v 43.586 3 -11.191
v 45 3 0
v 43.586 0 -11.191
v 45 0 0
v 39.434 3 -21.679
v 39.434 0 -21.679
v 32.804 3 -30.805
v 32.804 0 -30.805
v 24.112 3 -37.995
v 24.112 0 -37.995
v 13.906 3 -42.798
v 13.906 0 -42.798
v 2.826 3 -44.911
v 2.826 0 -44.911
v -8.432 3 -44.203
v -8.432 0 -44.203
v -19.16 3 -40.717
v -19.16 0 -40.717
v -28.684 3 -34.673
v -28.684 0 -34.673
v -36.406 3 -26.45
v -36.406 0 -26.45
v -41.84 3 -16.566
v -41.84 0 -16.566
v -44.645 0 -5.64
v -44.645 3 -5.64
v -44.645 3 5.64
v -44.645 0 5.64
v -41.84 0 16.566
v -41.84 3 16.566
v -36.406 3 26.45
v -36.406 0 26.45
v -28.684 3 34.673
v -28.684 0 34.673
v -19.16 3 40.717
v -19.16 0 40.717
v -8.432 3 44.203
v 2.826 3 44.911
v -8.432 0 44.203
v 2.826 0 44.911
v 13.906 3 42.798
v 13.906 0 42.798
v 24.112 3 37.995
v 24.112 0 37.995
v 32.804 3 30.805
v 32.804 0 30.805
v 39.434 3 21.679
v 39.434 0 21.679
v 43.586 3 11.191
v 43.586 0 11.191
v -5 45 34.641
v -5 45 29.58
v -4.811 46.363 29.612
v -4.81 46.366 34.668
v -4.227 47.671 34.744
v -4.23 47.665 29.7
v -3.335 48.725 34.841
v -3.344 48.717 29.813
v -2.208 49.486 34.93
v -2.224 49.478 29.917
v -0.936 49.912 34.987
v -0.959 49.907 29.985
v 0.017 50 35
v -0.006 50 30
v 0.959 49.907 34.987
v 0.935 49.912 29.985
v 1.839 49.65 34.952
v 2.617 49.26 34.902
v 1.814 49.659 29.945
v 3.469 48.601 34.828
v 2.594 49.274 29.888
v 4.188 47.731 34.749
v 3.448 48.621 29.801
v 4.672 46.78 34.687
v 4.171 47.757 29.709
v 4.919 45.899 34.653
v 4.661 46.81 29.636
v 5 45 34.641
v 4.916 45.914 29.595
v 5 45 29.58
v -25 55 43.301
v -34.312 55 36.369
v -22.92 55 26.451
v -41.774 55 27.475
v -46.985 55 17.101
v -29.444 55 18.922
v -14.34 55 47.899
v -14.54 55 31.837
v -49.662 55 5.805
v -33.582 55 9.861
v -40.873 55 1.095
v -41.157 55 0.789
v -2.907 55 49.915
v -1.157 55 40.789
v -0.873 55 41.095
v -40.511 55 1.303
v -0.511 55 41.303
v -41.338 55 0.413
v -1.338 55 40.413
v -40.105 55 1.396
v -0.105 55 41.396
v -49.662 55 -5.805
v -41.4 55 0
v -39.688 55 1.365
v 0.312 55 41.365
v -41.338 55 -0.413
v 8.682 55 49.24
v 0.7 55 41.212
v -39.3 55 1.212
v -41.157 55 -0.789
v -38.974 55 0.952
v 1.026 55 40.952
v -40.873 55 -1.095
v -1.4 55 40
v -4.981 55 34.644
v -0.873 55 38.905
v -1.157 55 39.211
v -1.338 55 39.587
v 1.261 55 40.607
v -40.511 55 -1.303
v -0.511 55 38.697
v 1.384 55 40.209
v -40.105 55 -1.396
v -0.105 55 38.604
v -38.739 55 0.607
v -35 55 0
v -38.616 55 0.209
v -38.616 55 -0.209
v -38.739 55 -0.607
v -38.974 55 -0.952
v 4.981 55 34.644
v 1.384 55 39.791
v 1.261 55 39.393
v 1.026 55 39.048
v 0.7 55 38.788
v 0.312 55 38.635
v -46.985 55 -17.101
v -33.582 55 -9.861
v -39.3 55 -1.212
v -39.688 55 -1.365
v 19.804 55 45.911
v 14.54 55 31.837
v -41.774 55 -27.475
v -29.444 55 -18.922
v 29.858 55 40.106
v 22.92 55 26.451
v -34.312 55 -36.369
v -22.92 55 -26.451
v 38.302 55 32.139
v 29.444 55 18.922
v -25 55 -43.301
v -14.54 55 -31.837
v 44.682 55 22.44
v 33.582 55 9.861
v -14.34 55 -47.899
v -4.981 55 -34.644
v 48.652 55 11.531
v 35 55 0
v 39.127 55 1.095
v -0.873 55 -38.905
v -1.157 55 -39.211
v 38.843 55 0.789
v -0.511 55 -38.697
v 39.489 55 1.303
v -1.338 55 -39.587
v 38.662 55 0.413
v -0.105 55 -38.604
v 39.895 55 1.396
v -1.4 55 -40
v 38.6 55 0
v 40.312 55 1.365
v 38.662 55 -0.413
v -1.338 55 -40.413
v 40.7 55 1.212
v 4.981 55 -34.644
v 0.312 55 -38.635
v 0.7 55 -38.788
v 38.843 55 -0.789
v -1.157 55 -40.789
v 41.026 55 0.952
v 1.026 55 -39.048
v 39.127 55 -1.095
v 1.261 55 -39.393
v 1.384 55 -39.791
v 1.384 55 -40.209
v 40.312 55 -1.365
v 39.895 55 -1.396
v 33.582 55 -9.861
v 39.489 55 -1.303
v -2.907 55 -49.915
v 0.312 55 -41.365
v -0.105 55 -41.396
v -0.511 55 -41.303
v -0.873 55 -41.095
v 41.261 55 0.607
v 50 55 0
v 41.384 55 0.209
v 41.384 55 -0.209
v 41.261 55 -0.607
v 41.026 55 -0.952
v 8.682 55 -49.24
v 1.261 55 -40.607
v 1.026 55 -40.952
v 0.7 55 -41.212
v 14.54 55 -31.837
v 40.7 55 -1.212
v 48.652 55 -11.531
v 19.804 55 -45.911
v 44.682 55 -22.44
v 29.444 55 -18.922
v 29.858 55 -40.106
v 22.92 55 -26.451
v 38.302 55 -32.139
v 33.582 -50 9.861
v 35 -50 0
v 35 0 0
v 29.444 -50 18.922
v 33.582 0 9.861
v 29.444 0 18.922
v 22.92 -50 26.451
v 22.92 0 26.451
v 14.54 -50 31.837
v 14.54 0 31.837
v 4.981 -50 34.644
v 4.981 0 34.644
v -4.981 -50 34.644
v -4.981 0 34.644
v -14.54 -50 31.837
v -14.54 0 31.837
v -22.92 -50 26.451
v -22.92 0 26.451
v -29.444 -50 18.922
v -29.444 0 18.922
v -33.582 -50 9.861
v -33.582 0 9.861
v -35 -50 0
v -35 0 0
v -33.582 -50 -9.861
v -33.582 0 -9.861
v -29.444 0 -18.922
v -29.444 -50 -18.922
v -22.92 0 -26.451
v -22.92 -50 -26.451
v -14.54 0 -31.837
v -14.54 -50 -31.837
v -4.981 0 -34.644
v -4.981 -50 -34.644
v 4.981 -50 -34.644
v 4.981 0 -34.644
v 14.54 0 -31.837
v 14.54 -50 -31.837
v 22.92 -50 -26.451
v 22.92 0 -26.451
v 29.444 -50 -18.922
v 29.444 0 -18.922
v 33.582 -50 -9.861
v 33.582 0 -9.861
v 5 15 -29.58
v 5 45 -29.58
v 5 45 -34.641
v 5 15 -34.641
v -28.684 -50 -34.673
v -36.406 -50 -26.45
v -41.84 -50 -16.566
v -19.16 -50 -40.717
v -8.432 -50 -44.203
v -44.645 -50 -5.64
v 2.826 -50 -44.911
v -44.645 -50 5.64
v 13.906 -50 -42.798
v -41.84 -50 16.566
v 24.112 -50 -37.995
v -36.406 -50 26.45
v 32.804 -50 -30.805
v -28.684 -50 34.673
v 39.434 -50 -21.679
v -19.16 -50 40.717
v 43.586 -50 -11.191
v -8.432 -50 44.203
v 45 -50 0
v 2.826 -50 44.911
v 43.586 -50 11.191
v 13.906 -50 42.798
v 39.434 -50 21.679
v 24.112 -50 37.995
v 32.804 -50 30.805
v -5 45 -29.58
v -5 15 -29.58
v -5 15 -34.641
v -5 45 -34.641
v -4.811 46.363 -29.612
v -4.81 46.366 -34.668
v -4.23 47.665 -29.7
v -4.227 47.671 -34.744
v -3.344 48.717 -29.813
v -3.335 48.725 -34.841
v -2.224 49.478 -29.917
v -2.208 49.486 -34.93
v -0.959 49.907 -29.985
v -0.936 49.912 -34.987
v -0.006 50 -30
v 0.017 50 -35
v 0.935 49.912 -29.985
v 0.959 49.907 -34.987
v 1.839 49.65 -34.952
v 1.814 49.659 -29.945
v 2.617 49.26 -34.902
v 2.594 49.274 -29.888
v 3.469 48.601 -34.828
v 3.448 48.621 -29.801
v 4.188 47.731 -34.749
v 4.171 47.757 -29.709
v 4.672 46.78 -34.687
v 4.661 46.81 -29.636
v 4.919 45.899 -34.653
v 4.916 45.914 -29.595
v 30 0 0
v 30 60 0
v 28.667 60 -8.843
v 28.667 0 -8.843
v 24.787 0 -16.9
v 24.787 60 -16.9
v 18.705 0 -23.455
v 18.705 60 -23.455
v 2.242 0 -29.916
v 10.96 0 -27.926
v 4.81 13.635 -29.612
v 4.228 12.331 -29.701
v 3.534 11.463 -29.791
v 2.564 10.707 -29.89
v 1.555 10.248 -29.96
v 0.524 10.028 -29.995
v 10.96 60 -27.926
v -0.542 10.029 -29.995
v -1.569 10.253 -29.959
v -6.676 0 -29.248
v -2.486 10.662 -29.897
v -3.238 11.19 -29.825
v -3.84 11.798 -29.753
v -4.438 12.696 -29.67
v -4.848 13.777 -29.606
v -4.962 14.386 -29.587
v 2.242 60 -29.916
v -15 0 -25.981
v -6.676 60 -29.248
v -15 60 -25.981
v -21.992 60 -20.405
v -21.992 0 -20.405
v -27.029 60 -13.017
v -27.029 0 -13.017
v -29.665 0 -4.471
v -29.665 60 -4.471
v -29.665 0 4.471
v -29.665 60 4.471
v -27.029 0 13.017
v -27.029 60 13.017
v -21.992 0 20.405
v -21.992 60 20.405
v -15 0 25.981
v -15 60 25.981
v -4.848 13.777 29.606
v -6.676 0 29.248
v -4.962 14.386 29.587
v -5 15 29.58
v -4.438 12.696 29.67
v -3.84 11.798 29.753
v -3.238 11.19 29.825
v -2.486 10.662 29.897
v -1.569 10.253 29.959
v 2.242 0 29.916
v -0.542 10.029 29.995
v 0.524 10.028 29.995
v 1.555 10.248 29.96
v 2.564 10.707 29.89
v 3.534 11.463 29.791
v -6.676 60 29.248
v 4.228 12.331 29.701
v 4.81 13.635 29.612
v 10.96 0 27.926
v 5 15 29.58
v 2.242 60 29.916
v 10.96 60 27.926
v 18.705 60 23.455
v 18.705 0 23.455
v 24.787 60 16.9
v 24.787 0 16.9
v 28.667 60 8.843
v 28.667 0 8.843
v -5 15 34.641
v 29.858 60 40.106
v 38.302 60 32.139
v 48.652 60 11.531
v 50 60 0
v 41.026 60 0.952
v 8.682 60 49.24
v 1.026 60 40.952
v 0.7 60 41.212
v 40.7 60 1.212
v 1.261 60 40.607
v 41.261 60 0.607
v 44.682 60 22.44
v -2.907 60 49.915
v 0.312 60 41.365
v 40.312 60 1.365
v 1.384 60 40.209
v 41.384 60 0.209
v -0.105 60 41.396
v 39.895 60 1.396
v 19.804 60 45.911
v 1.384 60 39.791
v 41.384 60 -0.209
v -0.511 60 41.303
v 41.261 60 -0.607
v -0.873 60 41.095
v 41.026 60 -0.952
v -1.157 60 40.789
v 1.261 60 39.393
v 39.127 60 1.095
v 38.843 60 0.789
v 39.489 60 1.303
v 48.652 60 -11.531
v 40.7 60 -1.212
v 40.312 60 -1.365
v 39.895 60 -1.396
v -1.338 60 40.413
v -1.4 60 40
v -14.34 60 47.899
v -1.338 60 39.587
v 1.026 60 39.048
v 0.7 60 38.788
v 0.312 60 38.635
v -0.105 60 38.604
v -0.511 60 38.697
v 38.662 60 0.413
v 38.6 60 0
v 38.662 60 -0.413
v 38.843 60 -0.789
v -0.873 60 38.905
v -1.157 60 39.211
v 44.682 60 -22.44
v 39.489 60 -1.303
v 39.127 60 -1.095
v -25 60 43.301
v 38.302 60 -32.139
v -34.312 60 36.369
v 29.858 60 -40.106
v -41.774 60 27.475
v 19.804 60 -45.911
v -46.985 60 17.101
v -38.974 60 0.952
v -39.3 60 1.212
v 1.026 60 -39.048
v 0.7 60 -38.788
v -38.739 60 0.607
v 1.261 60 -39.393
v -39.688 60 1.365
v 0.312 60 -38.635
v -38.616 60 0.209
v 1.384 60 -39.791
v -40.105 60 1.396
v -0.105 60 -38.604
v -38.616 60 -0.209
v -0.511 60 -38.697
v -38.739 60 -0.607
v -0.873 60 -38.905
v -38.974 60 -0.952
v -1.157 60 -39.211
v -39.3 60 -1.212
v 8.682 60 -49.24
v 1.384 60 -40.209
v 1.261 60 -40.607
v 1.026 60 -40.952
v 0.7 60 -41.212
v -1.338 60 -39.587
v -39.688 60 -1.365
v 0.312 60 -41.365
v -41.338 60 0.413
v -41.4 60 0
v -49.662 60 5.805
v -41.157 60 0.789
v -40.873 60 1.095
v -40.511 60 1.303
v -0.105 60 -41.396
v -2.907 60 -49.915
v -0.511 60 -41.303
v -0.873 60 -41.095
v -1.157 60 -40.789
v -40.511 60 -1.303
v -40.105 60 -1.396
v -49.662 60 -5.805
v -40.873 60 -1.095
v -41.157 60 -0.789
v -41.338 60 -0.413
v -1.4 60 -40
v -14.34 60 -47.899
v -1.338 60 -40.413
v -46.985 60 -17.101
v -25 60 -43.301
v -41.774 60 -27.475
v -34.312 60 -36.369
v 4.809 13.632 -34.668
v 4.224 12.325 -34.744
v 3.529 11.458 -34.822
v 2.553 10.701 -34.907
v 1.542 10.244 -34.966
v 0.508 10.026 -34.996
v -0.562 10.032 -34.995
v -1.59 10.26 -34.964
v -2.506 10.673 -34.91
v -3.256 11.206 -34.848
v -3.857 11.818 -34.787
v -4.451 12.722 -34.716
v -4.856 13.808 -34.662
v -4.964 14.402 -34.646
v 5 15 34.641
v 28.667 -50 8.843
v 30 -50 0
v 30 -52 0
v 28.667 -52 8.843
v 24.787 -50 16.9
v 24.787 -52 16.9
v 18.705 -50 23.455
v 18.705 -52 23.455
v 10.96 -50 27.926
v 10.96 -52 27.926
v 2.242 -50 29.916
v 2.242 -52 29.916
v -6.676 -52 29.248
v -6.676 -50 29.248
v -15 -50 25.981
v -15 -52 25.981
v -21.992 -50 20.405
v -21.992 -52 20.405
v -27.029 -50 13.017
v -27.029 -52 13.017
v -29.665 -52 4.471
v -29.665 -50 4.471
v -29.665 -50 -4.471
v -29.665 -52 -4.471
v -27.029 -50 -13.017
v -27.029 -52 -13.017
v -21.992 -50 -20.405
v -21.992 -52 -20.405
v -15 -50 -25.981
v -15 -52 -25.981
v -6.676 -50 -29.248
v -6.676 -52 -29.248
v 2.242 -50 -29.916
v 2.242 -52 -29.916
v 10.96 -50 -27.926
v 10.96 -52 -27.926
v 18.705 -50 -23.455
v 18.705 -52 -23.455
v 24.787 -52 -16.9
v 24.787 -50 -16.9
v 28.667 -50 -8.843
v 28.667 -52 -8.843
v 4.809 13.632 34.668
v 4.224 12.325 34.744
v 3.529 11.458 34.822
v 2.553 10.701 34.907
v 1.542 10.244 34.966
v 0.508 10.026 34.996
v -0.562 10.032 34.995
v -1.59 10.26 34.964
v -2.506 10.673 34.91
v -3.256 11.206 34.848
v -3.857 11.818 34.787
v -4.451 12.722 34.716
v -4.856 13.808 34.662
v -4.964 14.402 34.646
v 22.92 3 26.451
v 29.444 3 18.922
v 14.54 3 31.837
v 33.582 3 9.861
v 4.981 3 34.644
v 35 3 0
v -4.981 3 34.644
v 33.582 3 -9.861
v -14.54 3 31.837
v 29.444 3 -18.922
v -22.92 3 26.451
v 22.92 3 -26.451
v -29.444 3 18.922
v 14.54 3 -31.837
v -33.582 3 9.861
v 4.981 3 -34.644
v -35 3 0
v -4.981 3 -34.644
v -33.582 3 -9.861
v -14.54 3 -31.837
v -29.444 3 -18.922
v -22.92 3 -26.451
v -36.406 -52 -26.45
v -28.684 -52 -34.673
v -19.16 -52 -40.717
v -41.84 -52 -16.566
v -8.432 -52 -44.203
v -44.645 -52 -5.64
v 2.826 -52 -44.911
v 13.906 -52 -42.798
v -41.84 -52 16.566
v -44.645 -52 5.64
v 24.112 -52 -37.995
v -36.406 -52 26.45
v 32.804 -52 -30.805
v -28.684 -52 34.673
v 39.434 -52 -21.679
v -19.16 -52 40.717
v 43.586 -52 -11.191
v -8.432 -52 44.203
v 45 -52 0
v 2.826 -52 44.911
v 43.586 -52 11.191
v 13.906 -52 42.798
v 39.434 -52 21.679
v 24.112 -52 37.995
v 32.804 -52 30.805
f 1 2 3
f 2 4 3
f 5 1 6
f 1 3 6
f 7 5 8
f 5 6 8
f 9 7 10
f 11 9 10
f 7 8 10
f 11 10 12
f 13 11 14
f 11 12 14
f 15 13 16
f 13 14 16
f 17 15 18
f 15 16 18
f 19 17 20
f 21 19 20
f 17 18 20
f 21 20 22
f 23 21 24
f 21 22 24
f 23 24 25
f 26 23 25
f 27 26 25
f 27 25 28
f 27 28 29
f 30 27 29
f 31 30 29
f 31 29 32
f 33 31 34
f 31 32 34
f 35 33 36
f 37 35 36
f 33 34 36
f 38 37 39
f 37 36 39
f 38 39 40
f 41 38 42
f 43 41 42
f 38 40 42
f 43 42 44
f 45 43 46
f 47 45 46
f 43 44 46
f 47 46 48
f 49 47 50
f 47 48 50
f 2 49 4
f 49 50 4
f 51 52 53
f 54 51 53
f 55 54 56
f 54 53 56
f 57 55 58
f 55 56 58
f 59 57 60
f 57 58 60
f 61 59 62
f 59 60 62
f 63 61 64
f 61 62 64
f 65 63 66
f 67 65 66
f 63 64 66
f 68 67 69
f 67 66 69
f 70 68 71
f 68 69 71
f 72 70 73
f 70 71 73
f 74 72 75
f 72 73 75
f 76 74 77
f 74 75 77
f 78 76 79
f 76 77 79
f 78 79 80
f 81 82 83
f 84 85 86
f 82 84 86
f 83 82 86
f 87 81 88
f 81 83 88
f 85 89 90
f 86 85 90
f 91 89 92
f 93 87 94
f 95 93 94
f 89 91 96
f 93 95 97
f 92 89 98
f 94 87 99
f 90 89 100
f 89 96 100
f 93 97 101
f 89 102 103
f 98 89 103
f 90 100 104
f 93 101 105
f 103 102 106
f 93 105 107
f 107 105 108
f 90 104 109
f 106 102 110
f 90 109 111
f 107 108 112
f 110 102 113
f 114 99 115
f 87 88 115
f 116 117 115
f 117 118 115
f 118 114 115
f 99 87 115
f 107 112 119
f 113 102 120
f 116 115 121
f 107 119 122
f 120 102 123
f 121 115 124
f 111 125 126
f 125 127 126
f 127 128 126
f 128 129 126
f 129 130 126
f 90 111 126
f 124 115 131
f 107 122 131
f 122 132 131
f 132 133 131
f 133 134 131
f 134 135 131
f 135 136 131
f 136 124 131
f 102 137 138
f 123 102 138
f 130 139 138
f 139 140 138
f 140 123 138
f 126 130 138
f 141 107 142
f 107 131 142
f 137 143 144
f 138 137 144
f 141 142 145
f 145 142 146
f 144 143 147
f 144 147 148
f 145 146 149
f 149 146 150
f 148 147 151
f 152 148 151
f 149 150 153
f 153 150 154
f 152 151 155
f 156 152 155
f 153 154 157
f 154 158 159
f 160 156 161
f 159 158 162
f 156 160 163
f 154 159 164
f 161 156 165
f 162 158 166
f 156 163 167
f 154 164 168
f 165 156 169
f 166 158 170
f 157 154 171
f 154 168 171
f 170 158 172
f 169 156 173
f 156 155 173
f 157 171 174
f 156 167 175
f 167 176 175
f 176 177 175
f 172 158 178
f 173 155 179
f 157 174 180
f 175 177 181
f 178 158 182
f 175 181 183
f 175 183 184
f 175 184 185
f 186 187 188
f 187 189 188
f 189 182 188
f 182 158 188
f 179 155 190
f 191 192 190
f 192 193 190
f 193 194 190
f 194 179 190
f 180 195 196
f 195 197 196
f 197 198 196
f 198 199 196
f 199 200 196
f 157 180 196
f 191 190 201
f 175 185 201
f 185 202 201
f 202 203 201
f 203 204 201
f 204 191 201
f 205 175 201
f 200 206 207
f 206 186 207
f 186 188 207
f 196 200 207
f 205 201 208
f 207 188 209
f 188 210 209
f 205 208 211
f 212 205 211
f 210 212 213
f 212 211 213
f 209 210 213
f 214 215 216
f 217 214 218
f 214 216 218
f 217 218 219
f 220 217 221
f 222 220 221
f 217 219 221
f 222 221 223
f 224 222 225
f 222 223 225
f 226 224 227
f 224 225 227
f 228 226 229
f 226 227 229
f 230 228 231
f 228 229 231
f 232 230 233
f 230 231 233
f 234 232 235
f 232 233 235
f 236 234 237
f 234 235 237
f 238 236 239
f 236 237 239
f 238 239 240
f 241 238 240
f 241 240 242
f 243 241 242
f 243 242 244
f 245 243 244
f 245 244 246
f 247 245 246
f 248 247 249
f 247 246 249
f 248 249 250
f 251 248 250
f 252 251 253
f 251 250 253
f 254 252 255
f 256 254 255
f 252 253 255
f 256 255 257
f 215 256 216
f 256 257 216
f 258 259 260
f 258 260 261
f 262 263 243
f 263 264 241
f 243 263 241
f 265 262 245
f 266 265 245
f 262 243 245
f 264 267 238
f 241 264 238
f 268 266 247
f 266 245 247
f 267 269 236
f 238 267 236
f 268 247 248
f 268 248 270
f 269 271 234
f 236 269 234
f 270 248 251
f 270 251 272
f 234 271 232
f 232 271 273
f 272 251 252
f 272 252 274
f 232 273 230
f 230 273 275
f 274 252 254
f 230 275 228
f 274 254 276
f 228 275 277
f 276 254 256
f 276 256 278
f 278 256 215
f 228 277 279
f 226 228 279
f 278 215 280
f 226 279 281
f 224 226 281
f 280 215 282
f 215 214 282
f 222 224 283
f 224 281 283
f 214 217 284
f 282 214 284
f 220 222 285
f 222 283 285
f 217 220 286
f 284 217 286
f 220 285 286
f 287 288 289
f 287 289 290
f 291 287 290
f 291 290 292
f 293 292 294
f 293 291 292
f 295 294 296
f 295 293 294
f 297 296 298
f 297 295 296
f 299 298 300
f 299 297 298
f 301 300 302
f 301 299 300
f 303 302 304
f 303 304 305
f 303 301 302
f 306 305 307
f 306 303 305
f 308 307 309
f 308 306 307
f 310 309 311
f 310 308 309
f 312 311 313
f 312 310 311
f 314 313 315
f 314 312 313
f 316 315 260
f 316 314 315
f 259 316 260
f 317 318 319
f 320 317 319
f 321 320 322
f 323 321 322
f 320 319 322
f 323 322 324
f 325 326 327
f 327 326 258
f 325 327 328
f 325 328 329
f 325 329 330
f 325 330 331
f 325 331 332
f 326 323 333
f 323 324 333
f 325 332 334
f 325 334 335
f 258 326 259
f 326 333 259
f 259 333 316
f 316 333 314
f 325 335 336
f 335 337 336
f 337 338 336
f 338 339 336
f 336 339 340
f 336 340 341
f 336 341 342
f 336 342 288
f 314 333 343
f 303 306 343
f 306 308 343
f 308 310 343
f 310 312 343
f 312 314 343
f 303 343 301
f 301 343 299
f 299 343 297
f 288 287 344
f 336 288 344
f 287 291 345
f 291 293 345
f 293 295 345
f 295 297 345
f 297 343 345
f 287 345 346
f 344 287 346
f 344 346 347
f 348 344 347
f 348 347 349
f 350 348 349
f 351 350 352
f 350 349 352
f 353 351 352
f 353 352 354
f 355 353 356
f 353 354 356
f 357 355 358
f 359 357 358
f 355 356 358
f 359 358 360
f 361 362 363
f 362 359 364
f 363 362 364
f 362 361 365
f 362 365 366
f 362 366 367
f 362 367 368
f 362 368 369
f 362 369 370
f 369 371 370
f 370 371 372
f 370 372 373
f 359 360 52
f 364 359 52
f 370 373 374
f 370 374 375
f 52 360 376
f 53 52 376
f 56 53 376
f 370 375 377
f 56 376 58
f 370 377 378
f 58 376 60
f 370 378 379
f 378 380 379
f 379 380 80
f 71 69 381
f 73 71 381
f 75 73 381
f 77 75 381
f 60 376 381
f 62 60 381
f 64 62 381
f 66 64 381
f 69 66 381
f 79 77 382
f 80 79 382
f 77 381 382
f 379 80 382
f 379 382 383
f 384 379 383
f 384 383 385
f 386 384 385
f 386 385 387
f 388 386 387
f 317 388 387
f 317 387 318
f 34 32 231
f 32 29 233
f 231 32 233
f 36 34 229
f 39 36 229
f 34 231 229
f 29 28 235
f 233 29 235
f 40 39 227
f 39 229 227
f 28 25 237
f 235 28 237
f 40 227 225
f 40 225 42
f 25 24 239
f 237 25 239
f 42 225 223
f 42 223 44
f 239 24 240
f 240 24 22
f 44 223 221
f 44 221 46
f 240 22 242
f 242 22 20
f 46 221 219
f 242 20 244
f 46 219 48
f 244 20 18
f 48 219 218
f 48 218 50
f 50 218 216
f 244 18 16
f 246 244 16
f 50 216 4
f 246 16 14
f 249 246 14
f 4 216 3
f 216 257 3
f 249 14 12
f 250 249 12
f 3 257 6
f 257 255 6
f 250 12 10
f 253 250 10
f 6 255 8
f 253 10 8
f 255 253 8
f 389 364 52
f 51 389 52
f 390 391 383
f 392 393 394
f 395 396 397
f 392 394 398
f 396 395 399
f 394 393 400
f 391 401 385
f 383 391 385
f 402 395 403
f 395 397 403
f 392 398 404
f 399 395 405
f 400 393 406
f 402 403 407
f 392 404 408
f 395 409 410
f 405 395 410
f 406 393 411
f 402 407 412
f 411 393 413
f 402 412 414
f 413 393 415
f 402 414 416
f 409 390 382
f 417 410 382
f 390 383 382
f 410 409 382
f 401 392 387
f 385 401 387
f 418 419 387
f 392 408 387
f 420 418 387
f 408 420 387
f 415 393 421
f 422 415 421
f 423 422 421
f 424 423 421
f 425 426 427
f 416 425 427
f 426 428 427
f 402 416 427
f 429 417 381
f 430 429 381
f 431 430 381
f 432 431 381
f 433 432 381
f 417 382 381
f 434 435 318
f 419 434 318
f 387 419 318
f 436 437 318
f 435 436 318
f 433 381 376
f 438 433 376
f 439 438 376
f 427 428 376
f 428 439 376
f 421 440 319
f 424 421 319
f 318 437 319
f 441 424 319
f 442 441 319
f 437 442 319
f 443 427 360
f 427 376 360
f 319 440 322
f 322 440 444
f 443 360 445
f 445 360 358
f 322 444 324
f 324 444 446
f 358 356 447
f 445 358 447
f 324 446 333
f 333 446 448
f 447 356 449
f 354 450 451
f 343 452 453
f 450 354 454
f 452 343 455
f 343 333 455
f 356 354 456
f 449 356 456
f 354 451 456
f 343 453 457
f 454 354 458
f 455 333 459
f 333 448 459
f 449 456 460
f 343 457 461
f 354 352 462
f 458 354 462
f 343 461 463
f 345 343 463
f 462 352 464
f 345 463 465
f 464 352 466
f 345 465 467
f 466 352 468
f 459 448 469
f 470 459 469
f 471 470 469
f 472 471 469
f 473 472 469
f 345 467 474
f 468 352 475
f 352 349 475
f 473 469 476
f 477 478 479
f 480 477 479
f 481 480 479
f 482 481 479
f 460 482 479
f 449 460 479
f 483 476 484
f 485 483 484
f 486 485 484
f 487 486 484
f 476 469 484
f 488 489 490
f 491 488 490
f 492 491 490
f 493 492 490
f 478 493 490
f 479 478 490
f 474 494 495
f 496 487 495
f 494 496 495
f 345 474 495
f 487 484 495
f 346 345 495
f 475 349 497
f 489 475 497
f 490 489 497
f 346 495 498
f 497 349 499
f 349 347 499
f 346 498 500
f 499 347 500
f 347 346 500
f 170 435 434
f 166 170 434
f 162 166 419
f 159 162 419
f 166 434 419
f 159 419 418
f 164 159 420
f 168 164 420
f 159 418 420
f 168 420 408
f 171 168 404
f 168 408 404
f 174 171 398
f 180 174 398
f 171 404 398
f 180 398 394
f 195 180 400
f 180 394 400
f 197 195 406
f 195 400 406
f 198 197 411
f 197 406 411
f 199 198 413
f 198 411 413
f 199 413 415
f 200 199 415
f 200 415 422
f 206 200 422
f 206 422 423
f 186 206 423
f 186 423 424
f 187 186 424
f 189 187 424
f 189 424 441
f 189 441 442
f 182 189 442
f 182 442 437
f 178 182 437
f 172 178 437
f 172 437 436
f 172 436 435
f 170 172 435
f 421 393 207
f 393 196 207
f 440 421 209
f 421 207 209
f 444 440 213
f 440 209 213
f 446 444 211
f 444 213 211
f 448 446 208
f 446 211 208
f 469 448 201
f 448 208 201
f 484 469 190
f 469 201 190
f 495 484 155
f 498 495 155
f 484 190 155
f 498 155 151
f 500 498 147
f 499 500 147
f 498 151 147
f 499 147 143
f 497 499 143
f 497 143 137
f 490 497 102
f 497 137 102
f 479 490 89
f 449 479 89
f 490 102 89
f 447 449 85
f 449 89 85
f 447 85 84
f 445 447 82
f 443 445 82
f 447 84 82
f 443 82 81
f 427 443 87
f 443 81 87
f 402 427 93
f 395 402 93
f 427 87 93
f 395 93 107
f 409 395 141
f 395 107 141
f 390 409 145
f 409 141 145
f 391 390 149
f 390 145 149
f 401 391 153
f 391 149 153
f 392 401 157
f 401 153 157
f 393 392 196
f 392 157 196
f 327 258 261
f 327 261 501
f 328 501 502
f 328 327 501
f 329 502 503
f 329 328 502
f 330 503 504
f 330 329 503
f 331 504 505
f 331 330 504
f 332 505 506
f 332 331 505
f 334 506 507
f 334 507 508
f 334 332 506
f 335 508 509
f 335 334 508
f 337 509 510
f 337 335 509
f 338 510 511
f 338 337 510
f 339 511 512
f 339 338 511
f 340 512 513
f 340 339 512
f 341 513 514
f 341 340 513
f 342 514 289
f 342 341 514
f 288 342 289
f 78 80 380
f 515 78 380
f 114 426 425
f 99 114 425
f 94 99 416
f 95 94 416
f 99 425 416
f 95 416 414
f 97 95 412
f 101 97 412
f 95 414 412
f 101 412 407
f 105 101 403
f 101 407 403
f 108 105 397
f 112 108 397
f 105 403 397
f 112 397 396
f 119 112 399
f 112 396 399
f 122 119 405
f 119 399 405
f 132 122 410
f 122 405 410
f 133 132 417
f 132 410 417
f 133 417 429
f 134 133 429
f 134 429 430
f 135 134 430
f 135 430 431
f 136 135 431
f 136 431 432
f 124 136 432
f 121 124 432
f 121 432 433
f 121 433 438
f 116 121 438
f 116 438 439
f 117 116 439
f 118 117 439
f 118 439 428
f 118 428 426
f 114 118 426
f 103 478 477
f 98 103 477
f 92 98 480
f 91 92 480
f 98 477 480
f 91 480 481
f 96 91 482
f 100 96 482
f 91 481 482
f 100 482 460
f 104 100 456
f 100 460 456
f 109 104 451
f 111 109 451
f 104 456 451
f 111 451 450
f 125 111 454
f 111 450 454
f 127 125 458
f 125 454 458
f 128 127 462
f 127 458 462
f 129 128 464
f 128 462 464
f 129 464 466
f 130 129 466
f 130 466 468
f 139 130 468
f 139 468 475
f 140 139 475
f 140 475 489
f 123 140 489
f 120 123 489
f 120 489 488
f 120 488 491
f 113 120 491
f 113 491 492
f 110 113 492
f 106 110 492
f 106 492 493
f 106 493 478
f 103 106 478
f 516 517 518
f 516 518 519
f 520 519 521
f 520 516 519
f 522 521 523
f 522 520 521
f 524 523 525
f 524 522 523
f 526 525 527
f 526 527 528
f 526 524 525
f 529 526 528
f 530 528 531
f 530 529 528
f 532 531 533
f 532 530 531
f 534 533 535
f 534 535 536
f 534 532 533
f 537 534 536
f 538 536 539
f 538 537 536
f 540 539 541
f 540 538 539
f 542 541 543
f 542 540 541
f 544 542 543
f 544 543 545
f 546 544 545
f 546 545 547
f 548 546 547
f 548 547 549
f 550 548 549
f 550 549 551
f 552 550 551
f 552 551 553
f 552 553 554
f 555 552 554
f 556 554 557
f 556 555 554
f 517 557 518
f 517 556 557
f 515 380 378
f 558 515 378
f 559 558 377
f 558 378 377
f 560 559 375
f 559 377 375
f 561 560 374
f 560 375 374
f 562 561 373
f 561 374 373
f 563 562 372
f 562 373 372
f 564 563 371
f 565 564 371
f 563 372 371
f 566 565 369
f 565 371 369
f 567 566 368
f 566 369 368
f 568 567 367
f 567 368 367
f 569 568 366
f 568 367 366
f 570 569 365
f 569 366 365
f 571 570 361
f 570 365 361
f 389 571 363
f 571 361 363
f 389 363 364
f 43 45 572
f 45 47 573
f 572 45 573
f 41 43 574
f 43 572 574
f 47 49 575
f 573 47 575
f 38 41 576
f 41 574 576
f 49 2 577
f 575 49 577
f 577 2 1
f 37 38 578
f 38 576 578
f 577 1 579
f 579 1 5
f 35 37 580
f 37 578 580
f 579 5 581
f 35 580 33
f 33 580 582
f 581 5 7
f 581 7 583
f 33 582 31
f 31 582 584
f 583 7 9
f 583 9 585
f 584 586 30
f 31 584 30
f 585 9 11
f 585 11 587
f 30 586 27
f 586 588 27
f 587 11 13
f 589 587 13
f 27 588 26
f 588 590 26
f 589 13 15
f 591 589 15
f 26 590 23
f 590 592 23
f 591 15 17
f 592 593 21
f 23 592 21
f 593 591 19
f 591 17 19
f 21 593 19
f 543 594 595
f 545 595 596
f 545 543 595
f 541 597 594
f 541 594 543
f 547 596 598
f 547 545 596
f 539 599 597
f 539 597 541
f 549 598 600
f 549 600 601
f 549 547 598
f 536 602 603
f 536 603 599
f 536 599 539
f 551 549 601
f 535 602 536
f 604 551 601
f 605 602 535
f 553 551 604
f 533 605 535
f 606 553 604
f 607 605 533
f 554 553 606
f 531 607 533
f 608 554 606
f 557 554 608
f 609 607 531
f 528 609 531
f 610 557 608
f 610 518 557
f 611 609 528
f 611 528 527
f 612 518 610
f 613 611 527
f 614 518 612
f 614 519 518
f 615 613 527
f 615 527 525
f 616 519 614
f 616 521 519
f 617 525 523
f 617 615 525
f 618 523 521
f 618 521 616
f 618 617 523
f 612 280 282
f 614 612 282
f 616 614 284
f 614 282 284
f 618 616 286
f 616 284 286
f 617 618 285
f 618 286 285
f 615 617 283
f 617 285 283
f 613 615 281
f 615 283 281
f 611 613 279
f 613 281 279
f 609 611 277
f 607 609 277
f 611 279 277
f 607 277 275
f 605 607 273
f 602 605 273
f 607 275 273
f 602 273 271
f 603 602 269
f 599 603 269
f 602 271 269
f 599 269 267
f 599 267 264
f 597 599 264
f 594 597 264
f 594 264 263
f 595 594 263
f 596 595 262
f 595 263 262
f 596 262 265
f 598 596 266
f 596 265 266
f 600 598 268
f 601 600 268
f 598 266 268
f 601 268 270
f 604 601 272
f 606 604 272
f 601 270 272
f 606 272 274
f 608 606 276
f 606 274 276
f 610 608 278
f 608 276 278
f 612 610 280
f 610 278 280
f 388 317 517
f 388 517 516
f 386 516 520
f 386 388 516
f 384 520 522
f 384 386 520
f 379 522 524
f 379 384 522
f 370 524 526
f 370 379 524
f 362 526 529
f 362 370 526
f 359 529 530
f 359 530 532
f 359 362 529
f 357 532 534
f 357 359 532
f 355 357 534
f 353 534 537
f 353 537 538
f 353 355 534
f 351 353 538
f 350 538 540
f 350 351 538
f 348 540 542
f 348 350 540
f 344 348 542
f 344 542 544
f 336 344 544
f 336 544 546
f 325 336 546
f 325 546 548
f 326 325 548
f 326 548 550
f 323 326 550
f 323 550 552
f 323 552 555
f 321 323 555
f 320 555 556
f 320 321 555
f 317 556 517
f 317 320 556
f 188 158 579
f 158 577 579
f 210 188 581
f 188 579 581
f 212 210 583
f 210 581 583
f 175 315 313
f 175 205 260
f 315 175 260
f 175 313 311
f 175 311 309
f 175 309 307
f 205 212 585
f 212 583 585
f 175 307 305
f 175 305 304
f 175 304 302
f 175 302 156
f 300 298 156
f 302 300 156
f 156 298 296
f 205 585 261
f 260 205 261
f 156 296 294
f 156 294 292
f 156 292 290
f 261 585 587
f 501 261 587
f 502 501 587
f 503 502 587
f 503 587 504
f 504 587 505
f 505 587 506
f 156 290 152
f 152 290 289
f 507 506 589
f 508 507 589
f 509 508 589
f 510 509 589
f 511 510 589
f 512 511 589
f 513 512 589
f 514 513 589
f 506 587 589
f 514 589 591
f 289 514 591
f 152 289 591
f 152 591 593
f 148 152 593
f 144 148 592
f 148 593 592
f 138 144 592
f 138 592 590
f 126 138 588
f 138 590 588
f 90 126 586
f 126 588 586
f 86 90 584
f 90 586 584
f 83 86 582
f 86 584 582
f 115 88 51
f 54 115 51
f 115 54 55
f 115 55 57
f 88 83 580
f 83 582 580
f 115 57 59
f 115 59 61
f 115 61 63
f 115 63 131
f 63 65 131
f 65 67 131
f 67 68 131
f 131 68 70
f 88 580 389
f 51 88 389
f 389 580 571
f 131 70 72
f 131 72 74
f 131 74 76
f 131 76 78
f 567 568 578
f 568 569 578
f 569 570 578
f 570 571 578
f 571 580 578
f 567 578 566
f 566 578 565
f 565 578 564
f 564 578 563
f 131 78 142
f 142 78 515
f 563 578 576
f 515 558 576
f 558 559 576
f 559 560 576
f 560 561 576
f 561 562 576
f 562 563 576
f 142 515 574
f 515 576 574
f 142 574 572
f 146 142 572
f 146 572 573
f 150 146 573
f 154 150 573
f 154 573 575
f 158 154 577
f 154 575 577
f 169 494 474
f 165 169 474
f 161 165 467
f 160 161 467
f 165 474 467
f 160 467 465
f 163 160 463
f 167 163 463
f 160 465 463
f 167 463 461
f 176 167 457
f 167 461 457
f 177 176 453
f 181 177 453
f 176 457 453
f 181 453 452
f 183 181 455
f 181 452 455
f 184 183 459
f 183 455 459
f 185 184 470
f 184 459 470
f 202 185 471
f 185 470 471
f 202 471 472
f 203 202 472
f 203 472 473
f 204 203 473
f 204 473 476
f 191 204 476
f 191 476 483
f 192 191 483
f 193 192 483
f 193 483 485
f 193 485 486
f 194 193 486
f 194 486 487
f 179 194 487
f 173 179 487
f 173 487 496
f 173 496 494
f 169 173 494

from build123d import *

# Parameters (mm, degrees)
SKETCH_2_R               = 35
SKETCH_2_R_2             = 30
EXTRUDE_1_DEPTH          = 50
SKETCH_3_R               = 45
SKETCH_3_R_2             = 30
EXTRUDE_2_DEPTH          = 2
CUT_EXTRUDE_1_REACH      = 134.454
SKETCH_4_R               = 1.4
CUT_EXTRUDE_2_DEPTH      = 93.736184955
CUT_EXTRUDE_2_DEPTH_BACK = 93.736184955


with BuildPart() as part:
    # 草图1 → 旋转1 (revolve)
    with BuildSketch(Plane.XY, mode=Mode.PRIVATE) as revolve_1_sk:
        Polygon((-45, 0), (-30, 0), (-30, 60), (-50, 60), (-50, 55), (-35, 55), (-35, 3), (-45, 3), align=None)
    revolve(revolve_1_sk.sketch.rotate(Axis((0, -563.187180309, 0), (0, 1, 0)), 180), axis=Axis((0, -563.187180309, 0), (0, 1, 0)))

    # 草图2 → 凸台-拉伸1 (add)
    with BuildSketch(Plane.XZ):
        Circle(SKETCH_2_R)
        Circle(SKETCH_2_R_2, mode=Mode.SUBTRACT)
    extrude(amount=EXTRUDE_1_DEPTH)

    # 草图3 → 凸台-拉伸2 (add)
    with BuildSketch(Plane.XZ.offset(50)):
        Circle(SKETCH_3_R)
        Circle(SKETCH_3_R_2, mode=Mode.SUBTRACT)
    extrude(amount=EXTRUDE_2_DEPTH)

    # 草图4 → 切除-拉伸1 (cut, up to next)
    with BuildSketch(Plane(origin=(0, 60, 0), x_dir=(1, 0, 0), z_dir=(0, 1, 0)), mode=Mode.PRIVATE) as cut_extrude_1_sk1:
        with Locations(Location((0, 40, 0), (0, 0, 180))):
            Circle(SKETCH_4_R)
    cut_extrude_1_tool1 = extrude(cut_extrude_1_sk1.sketch, amount=-CUT_EXTRUDE_1_REACH, mode=Mode.PRIVATE) & part.part
    # 草图4 → 切除-拉伸1 (cut, up to next)
    with BuildSketch(Plane(origin=(0, 60, 0), x_dir=(1, 0, 0), z_dir=(0, 1, 0)), mode=Mode.PRIVATE) as cut_extrude_1_sk2:
        with Locations(Location((40, 0, 0), (0, 0, 180))):
            Circle(SKETCH_4_R)
    cut_extrude_1_tool2 = extrude(cut_extrude_1_sk2.sketch, amount=-CUT_EXTRUDE_1_REACH, mode=Mode.PRIVATE) & part.part
    # 草图4 → 切除-拉伸1 (cut, up to next)
    with BuildSketch(Plane(origin=(0, 60, 0), x_dir=(1, 0, 0), z_dir=(0, 1, 0)), mode=Mode.PRIVATE) as cut_extrude_1_sk3:
        with Locations(Location((0, -40, 0), (0, 0, 180))):
            Circle(SKETCH_4_R)
    cut_extrude_1_tool3 = extrude(cut_extrude_1_sk3.sketch, amount=-CUT_EXTRUDE_1_REACH, mode=Mode.PRIVATE) & part.part
    # 草图4 → 切除-拉伸1 (cut, up to next)
    with BuildSketch(Plane(origin=(0, 60, 0), x_dir=(1, 0, 0), z_dir=(0, 1, 0)), mode=Mode.PRIVATE) as cut_extrude_1_sk4:
        with Locations(Location((-40, 0, 0), (0, 0, 180))):
            Circle(SKETCH_4_R)
    cut_extrude_1_tool4 = extrude(cut_extrude_1_sk4.sketch, amount=-CUT_EXTRUDE_1_REACH, mode=Mode.PRIVATE) & part.part
    add(cut_extrude_1_tool1.solids().sort_by_distance((0, 60, -40))[0], mode=Mode.SUBTRACT)
    add(cut_extrude_1_tool2.solids().sort_by_distance((40, 60, 0))[0], mode=Mode.SUBTRACT)
    add(cut_extrude_1_tool3.solids().sort_by_distance((0, 60, 40))[0], mode=Mode.SUBTRACT)
    add(cut_extrude_1_tool4.solids().sort_by_distance((-40, 60, 0))[0], mode=Mode.SUBTRACT)

    # 草图5 → 切除-拉伸2 (cut, two sides)
    with BuildSketch(Plane.XY) as cut_extrude_2_sk:
        with BuildLine():
            Line((5, 45), (5, 15))
            ThreePointArc((5, 15), (0, 10), (-5, 15))
            Line((-5, 15), (-5, 45))
            ThreePointArc((-5, 45), (0, 50), (5, 45))
        make_face()
    extrude(amount=CUT_EXTRUDE_2_DEPTH, mode=Mode.SUBTRACT)
    extrude(cut_extrude_2_sk.sketch, amount=-CUT_EXTRUDE_2_DEPTH_BACK, mode=Mode.SUBTRACT)


solid = part.part
